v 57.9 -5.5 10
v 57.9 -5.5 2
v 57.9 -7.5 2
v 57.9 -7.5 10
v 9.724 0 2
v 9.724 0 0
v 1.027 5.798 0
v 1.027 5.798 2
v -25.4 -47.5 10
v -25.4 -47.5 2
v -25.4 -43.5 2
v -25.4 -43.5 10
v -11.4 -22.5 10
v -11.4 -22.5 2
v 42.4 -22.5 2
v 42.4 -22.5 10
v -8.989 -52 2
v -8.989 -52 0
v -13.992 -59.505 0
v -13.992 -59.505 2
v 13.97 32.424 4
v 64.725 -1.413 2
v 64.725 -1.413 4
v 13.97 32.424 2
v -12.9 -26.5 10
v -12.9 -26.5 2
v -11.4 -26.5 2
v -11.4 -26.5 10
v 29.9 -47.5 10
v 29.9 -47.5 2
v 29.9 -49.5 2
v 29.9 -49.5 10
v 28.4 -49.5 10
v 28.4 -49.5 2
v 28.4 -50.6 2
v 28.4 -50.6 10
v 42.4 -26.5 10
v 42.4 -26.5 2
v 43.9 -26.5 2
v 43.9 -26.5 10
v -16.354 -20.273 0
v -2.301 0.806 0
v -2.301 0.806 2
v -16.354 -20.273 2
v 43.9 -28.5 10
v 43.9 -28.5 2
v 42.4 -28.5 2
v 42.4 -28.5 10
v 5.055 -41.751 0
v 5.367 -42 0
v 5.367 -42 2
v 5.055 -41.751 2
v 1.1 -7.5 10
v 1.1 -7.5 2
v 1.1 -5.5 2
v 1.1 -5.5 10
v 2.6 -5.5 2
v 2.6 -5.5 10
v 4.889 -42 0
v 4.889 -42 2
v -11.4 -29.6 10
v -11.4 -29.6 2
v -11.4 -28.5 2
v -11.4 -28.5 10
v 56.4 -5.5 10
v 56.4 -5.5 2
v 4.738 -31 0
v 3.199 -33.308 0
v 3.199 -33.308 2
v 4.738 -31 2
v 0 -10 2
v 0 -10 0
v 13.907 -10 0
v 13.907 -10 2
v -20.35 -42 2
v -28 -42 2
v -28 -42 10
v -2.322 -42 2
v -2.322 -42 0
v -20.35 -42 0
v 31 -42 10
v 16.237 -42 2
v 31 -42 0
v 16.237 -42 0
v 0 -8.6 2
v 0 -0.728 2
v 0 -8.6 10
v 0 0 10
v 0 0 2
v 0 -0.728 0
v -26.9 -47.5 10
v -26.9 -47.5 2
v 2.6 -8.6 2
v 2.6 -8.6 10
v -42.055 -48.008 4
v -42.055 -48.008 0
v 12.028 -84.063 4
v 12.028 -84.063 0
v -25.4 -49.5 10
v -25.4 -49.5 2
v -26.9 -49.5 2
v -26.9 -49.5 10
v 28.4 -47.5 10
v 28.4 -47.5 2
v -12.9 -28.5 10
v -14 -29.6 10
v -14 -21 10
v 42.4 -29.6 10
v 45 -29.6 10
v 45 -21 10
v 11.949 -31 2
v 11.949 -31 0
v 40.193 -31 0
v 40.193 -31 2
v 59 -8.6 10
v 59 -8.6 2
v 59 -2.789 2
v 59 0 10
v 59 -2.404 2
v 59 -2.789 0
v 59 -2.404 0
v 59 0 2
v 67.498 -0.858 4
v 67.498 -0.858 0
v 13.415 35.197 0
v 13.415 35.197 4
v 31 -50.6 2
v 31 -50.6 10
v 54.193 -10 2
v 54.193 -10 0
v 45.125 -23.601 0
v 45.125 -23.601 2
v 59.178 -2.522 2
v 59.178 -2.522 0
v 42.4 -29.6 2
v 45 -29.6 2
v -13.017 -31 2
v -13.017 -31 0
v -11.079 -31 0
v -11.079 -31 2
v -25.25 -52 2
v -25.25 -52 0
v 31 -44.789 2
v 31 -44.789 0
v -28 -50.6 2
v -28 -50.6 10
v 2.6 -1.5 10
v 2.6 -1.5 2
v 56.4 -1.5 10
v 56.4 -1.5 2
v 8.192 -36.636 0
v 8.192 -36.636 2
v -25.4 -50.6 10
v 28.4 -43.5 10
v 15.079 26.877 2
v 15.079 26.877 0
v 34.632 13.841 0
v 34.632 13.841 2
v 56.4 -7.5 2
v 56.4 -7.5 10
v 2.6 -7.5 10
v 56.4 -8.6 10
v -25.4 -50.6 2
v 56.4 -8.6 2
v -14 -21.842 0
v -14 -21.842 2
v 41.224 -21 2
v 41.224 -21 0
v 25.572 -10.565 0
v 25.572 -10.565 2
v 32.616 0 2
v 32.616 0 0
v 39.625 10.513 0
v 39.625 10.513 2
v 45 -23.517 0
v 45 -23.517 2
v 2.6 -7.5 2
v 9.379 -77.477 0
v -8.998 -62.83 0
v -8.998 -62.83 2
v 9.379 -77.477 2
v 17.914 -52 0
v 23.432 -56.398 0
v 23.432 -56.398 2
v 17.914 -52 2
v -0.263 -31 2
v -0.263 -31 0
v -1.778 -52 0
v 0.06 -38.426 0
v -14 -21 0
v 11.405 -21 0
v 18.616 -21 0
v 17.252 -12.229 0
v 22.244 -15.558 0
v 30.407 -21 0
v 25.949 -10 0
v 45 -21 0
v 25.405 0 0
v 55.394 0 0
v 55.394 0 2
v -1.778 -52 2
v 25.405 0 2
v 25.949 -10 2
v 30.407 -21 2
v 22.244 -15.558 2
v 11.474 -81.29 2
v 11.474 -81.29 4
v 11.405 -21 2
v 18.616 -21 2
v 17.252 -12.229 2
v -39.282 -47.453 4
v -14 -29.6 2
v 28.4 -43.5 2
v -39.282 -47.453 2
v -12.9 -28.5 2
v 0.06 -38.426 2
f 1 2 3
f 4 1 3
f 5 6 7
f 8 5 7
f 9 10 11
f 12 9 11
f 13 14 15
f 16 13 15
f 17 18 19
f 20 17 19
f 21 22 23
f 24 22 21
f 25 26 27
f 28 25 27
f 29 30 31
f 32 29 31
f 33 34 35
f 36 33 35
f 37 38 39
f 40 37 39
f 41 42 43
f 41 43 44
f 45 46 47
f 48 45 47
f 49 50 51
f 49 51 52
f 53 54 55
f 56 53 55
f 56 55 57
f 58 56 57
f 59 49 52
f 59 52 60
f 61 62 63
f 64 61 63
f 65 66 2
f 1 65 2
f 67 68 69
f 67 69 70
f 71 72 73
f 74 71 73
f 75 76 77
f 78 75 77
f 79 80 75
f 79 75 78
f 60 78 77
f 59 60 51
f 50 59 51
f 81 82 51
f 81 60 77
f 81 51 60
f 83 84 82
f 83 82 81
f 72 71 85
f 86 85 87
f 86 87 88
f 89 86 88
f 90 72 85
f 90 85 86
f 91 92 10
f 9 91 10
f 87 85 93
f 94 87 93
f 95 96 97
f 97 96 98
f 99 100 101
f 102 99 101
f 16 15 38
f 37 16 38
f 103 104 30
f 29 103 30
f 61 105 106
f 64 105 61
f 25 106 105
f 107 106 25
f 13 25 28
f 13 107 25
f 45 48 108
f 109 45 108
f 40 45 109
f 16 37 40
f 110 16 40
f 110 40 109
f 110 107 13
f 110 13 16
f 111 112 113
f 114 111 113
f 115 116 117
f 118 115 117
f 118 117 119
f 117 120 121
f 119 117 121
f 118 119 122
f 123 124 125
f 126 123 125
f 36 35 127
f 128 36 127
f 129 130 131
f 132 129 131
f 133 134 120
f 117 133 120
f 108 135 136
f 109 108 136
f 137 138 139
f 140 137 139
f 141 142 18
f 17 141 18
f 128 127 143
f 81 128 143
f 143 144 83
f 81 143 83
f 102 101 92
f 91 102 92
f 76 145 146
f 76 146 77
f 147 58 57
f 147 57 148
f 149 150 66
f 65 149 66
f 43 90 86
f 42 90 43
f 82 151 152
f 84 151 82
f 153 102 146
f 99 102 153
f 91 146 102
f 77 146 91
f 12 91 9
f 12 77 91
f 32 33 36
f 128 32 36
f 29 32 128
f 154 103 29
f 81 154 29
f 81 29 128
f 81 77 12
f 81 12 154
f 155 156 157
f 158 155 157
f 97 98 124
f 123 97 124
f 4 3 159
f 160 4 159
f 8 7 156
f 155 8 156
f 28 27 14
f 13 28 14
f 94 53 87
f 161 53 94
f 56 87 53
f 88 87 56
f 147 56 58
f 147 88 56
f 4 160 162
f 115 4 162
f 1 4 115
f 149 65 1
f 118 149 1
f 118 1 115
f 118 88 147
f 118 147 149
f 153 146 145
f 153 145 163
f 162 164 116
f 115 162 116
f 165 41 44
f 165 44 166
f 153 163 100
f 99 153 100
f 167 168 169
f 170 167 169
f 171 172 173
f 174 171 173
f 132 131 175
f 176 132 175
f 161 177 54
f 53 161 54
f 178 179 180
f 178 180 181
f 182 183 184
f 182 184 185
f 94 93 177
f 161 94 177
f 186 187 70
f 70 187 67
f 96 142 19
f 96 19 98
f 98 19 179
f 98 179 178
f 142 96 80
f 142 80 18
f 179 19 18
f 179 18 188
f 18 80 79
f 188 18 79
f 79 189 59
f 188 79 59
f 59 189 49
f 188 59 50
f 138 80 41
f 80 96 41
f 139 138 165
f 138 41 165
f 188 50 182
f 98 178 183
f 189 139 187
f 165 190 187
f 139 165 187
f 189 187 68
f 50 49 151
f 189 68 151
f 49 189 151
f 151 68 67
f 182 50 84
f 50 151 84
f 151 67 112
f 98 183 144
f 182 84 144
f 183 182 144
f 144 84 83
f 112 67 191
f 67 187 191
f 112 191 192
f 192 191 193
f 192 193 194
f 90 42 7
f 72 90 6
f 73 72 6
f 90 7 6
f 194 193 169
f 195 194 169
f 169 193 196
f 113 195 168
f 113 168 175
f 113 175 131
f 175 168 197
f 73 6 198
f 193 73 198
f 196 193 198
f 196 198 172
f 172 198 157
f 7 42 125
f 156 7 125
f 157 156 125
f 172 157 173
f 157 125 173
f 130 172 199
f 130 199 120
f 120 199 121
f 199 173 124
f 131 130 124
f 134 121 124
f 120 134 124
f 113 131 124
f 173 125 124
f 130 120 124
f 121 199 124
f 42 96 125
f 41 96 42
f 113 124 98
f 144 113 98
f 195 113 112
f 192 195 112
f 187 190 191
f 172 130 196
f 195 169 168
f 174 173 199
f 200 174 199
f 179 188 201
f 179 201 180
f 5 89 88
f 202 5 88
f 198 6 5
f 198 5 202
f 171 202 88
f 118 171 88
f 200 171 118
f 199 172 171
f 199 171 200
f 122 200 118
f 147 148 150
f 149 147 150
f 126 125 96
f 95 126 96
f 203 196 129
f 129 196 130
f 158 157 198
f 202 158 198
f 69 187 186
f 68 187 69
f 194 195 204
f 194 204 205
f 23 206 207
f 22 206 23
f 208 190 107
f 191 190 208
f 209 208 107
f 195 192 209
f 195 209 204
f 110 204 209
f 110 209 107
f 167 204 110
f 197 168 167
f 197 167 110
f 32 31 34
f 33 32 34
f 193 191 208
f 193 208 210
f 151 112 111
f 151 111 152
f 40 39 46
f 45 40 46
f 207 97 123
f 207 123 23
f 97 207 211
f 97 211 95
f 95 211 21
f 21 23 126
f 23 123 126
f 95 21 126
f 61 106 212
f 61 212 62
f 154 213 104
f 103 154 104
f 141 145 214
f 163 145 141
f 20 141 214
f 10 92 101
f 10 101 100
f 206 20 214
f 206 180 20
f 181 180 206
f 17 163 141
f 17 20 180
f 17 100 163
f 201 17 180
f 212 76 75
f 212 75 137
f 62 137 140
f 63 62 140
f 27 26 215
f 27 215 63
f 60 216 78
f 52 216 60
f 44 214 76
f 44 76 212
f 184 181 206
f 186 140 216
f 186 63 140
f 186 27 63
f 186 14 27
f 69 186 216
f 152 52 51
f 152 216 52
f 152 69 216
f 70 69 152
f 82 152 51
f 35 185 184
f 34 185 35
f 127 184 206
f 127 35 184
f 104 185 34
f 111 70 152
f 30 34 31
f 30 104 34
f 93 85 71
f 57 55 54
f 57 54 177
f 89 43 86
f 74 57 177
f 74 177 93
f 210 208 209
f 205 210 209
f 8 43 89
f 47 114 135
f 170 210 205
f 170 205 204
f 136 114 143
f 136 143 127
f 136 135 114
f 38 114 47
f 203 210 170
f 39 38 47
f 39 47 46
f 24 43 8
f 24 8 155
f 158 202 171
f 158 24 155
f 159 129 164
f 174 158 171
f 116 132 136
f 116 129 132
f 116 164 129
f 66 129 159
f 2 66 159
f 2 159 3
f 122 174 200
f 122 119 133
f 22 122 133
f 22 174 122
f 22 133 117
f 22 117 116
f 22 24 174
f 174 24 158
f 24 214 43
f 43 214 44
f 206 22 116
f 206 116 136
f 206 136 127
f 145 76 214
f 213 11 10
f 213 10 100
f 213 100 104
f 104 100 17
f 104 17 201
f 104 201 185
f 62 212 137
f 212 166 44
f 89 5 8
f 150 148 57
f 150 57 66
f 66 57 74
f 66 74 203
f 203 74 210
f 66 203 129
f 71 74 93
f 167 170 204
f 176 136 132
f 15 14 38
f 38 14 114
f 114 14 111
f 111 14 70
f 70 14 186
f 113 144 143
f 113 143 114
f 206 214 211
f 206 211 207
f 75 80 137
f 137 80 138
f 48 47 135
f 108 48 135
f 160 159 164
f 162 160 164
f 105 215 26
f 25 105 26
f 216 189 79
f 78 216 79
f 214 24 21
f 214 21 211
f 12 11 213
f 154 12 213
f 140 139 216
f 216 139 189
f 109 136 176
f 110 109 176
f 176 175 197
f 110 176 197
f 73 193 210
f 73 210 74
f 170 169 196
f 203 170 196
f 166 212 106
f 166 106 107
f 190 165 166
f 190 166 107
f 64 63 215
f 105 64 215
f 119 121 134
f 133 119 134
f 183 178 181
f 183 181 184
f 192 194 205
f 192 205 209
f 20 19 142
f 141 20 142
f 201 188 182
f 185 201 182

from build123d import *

# Parameters (mm, degrees)
PAD002_DEPTH = 4
PAD001_DEPTH = 10
SKETCH_W     = 59
SKETCH_H     = 10
PAD_DEPTH    = 2
PAD003_DEPTH = 2


with BuildPart() as pad002:
    # Sketch002 → Pad002 (new body)
    with BuildSketch(Plane.XY):
        Polygon((13.415017, 35.19739), (67.498286, -0.858122), (12.028266, -84.063152), (-42.055003, -48.007639), align=None)
        Polygon((13.969717, 32.423889), (-39.281502, -47.452939), (11.473566, -81.289651), (64.724785, -1.412822), align=None, mode=Mode.SUBTRACT)
    extrude(amount=PAD002_DEPTH)


with BuildPart() as pad001:
    # Sketch001 → Pad001 (new body)
    with BuildSketch(Plane.XY):
        Polygon((0, 0), (0, -8.6), (2.6, -8.6), (2.6, -7.5), (1.1, -7.5), (1.1, -5.5), (2.6, -5.5), (2.6, -1.5), (56.4, -1.5), (56.4, -5.5), (57.9, -5.5), (57.9, -7.5), (56.4, -7.5), (56.4, -8.6), (59, -8.6), (59, 0), align=None)
    extrude(amount=PAD001_DEPTH)


with BuildPart() as pad:
    # Sketch → Pad (new body)
    with BuildSketch(Plane.XY):
        with Locations((29.5, -5)):
            Rectangle(SKETCH_W, SKETCH_H)
    extrude(amount=PAD_DEPTH)


with BuildPart() as relay002:
    # Fusion001 base: copy of Pad
    add(pad.part)

    # Fusion001: union Pad001
    add(pad001.part)


with BuildPart() as relay002_1:
    # Fusion001 placement: moved
    add(relay002.part.moved(Location((-14, -21, 0))))


with BuildPart() as relay001:
    # Fusion base: copy of Pad
    add(pad.part)

    # Fusion: union Pad001
    add(pad001.part)


with BuildPart() as relay003:
    # Fusion002 base: copy of Pad
    add(pad.part)

    # Fusion002: union Pad001
    add(pad001.part)


with BuildPart() as relay003_1:
    # Fusion002 placement: moved
    add(relay003.part.moved(Location((-28, -42, 0))))


with BuildPart() as fusion003:
    # Sketch003 → Pad003 (new body)
    with BuildSketch(Plane.XY):
        Polygon((13.415017, 35.19739), (-42.055003, -48.007639), (12.028266, -84.063152), (67.498286, -0.858122), align=None)
        Polygon((15.079117, 26.876888), (34.632299, 13.841433), (20.579895, -7.237174), (1.026713, 5.79828), align=None, mode=Mode.SUBTRACT)
        Polygon((39.624601, 10.513232), (59.177783, -2.522223), (45.125378, -23.60083), (25.572196, -10.565375), align=None, mode=Mode.SUBTRACT)
        Polygon((-2.301489, 0.805979), (-16.353893, -20.272629), (3.199289, -33.308083), (17.251693, -12.229476), align=None, mode=Mode.SUBTRACT)
        Polygon((22.243995, -15.557677), (8.19159, -36.636284), (27.744772, -49.671739), (41.797177, -28.593132), align=None, mode=Mode.SUBTRACT)
        Polygon((0.059977, -38.426311), (-13.992428, -59.504919), (-26.473182, -51.184416), (-12.420777, -30.105808), align=None, mode=Mode.SUBTRACT)
        Polygon((5.054661, -41.750937), (-8.997744, -62.829544), (9.379179, -77.476683), (23.431584, -56.398076), align=None, mode=Mode.SUBTRACT)
    extrude(amount=PAD003_DEPTH)

    # Fusion003: union Pad002, Relay002, Relay001, Relay003
    add(pad002.part)
    add(relay002_1.part)
    add(relay001.part)
    add(relay003_1.part)


solid = fusion003.part
